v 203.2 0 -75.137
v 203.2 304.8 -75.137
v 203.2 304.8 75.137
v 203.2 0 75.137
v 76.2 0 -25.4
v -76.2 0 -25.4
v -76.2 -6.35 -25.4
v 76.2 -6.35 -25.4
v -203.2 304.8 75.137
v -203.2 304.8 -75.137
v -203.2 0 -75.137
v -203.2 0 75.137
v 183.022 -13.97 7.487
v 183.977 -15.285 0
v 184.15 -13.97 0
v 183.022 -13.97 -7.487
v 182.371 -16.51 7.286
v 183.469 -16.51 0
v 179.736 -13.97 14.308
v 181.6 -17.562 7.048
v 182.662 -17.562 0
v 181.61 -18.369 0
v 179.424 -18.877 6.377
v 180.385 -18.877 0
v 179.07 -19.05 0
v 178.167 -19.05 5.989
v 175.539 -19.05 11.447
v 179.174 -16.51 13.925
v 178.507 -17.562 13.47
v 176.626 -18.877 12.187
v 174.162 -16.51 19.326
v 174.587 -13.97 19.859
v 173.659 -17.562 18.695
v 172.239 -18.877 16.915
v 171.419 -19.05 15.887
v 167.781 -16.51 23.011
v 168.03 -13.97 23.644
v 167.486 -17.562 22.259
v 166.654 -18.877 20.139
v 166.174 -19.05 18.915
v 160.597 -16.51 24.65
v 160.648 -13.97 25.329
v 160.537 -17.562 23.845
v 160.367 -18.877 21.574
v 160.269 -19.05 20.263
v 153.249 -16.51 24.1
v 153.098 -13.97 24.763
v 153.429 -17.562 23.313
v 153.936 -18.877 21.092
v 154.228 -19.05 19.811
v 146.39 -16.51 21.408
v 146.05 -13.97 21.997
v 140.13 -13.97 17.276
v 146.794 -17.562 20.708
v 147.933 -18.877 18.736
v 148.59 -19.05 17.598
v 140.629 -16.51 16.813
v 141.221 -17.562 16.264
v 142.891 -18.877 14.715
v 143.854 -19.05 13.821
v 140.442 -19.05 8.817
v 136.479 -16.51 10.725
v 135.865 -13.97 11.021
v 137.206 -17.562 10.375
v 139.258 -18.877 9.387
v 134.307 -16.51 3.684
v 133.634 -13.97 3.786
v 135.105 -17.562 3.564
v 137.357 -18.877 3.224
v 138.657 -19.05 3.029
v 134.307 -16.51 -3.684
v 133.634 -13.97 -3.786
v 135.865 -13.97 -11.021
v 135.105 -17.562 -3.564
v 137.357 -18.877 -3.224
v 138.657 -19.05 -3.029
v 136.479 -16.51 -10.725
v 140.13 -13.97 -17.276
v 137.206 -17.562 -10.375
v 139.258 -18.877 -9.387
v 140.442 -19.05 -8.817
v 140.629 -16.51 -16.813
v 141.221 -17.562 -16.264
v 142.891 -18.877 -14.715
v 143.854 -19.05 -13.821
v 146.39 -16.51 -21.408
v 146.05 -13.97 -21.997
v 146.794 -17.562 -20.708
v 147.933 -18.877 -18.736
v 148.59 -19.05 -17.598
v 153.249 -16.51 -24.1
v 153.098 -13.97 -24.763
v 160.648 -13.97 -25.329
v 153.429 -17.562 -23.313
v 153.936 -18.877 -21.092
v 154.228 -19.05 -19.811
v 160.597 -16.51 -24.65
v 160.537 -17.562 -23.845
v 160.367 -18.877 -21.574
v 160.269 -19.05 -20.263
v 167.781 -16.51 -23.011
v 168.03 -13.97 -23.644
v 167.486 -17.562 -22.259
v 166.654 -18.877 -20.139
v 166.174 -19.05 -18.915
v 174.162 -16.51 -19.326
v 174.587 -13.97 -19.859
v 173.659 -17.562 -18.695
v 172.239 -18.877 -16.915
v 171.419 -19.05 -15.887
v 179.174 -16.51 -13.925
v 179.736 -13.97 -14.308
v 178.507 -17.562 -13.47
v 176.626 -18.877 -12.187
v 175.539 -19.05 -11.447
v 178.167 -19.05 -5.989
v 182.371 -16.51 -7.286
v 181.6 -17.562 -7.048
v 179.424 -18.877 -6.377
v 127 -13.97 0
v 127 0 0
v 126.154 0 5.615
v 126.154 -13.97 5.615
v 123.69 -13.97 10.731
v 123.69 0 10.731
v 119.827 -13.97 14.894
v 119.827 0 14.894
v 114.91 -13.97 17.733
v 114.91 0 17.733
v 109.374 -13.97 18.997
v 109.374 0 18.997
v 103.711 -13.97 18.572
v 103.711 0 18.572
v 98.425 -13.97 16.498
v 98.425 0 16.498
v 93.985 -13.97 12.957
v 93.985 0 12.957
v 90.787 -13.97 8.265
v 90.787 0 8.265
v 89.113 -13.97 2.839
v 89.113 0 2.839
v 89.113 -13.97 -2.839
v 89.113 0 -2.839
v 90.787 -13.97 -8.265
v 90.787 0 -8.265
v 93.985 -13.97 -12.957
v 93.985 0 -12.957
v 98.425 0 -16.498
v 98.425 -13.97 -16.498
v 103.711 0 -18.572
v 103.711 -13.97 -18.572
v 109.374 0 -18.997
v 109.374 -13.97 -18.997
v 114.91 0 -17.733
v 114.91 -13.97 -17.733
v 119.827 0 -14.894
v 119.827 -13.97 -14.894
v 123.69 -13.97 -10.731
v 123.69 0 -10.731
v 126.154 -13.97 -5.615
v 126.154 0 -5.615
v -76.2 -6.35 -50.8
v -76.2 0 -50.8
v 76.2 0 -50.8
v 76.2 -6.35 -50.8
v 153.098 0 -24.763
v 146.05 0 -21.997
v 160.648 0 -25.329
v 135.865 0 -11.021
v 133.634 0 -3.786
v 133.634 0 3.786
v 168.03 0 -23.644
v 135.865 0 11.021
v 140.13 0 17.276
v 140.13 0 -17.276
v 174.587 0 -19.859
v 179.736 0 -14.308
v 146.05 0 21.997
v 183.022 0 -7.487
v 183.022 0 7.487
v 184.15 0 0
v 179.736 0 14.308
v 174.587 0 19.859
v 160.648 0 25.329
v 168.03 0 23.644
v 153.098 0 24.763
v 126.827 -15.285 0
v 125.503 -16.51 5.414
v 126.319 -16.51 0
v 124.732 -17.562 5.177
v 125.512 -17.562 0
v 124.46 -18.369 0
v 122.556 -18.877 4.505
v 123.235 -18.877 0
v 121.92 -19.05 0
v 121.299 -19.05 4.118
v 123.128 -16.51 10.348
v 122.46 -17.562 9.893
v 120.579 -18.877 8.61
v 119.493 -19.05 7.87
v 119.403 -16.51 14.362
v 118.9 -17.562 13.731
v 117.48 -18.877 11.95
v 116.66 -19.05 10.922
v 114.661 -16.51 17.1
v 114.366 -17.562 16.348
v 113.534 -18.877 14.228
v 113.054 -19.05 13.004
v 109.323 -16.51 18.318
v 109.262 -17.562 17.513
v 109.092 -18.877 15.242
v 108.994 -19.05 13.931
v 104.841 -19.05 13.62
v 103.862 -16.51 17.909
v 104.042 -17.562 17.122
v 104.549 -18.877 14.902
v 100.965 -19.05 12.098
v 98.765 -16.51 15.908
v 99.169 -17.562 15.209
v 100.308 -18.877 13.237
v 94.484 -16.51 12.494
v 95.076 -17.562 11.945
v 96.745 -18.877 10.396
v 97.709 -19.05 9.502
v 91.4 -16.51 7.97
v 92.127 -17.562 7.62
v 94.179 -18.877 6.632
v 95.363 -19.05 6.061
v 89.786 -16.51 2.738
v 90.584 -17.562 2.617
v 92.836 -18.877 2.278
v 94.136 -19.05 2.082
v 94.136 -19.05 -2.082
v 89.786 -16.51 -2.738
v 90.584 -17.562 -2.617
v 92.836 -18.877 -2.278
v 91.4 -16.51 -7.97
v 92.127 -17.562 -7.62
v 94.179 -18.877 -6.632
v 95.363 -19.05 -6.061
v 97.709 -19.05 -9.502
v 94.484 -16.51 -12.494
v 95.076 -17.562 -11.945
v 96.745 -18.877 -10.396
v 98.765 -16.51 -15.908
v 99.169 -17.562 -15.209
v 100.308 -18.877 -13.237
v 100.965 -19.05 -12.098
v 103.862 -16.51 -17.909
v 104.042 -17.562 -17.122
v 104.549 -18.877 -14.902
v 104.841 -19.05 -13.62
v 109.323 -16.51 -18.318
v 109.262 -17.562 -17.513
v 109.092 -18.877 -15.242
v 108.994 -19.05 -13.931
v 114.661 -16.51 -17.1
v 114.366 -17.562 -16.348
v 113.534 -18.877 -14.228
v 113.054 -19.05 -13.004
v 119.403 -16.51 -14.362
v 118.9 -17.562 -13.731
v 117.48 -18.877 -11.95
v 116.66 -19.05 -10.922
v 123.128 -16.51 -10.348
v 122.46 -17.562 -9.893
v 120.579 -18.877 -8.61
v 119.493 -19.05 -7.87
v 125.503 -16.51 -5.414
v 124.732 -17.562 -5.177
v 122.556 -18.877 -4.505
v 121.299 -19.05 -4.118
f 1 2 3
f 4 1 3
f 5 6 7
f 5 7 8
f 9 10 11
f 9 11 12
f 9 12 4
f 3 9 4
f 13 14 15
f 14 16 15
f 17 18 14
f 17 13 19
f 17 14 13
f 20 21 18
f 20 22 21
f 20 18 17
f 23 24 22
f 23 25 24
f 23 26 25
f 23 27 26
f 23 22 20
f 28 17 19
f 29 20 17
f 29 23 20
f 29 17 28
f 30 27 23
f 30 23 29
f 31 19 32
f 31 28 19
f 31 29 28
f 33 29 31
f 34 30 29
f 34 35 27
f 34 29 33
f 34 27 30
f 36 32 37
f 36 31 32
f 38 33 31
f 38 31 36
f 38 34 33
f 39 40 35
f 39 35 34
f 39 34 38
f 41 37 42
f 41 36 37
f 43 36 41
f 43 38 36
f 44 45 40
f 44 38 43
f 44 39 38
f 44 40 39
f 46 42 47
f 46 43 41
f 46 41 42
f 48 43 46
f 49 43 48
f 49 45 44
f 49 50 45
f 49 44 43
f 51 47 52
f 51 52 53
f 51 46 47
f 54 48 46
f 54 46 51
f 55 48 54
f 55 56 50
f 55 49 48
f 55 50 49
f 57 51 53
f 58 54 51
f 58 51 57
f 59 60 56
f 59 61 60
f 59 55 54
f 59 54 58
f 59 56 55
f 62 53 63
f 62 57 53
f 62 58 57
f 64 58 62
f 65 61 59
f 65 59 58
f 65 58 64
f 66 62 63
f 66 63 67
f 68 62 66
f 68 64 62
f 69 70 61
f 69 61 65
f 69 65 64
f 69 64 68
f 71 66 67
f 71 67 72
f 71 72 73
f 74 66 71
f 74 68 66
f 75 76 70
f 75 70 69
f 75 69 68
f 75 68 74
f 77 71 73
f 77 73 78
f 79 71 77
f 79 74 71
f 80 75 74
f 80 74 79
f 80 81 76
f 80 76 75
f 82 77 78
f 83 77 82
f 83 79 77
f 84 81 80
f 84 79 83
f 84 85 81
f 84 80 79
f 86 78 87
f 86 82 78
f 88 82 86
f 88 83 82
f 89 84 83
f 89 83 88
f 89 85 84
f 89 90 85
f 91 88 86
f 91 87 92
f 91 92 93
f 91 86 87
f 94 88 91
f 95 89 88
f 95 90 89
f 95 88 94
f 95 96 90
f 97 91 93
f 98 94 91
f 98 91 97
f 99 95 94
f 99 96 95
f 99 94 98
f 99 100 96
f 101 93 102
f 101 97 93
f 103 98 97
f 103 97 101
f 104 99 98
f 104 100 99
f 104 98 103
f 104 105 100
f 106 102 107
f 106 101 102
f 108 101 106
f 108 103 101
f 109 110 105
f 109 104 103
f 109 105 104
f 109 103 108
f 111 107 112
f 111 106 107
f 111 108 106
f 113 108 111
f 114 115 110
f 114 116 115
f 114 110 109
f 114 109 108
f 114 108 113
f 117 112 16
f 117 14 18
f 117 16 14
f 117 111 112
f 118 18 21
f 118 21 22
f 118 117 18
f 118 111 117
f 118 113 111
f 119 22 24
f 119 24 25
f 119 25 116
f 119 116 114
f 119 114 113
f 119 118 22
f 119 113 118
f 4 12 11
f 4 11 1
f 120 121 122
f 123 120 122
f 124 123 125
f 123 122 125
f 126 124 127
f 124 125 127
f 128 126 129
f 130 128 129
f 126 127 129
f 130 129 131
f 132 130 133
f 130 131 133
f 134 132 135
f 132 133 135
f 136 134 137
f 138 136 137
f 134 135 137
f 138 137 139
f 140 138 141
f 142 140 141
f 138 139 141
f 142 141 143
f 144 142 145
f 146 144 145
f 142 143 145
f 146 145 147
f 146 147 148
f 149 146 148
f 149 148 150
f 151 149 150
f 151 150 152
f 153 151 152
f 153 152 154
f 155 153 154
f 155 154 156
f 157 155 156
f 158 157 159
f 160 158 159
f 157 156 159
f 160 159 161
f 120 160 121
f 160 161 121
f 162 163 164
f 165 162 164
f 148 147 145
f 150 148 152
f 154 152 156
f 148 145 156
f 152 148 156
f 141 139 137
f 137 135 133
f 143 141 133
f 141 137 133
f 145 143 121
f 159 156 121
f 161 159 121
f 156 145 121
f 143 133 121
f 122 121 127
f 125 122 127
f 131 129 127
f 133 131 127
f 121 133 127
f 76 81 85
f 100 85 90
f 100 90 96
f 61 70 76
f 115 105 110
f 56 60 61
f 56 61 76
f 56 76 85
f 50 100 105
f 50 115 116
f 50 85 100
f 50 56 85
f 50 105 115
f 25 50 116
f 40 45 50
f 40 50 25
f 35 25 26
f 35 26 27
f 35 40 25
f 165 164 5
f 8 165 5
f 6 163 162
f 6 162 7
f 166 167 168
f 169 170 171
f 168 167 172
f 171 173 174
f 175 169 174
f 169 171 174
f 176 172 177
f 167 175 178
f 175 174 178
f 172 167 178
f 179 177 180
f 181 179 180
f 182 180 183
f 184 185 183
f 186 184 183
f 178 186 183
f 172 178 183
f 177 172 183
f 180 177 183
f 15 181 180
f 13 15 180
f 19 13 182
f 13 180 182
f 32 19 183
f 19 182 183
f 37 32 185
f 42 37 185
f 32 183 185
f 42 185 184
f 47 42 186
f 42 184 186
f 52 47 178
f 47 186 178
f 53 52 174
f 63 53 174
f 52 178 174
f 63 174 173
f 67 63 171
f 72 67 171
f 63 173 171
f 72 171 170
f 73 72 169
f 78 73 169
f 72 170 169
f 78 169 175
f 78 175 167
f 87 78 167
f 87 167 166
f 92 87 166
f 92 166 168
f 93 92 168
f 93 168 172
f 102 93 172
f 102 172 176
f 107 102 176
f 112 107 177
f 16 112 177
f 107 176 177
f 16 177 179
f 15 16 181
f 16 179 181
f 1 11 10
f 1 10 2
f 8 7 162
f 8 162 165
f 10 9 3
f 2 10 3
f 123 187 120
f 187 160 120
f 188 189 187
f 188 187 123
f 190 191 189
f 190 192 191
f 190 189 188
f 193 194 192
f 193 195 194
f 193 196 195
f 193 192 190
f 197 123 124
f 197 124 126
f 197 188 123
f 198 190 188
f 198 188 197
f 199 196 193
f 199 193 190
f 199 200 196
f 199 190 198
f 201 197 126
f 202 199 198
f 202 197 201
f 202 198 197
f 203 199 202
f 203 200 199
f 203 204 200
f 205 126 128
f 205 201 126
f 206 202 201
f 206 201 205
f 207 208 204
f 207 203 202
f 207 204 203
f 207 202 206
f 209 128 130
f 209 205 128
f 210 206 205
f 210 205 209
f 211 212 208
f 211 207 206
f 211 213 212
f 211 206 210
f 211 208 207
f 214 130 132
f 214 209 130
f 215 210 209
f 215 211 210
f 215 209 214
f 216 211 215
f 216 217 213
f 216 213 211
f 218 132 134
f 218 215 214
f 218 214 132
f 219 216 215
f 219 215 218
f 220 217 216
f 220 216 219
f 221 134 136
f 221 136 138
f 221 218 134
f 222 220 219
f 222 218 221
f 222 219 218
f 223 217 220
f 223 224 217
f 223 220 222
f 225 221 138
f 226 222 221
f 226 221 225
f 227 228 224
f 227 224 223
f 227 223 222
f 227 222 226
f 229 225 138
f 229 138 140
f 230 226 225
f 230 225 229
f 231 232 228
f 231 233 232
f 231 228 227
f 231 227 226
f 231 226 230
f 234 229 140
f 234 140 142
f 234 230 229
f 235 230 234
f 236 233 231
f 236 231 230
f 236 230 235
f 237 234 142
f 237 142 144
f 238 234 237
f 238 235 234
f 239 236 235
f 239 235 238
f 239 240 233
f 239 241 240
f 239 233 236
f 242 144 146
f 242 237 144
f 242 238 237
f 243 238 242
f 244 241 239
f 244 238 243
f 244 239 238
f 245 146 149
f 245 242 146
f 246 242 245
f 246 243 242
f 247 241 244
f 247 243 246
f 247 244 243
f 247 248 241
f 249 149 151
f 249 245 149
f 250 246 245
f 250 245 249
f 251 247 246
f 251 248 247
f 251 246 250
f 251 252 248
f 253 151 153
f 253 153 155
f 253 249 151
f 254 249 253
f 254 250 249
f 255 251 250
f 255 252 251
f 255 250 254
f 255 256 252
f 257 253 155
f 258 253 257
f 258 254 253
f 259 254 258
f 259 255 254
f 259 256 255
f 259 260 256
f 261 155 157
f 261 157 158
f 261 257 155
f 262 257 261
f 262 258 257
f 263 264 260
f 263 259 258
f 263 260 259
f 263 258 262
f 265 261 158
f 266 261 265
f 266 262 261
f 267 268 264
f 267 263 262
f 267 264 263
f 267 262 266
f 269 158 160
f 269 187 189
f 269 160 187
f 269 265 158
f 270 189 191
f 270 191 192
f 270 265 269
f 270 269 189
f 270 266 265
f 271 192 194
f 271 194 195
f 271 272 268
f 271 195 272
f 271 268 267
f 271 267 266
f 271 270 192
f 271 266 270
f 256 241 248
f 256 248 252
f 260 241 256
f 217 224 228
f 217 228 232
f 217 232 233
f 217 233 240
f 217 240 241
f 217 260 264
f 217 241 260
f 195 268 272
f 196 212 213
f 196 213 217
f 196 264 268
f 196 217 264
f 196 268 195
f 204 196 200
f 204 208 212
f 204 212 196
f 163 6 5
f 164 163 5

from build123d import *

# Parameters (mm, degrees)
F0_W     = 406.4
F0_H     = 150.273638
F1_DEPTH = 304.8
F2_R     = 19.05
F2_R_2   = 25.4
F3_DEPTH = 19.05
F4_R     = 5.08
F5_W     = 152.4
F5_H     = 25.4
F6_DEPTH = 6.35


with BuildPart() as f1:
    # F0 (on Front) → F1 (new body)
    with BuildSketch(Plane.XZ):
        Rectangle(F0_W, F0_H)
    extrude(amount=-F1_DEPTH)


with BuildPart() as f3:
    # F2 (on face) → F3 (new body)
    with BuildSketch(Plane.XZ):
        with Locations((107.95, 0)):
            Circle(F2_R)
        with Locations((158.75, 0)):
            Circle(F2_R_2)
    extrude(amount=F3_DEPTH)

    # F4
    f4_edges = [f3.edges().sort_by_distance(p)[0] for p in [
        (88.9, -19.05, 0),
        (133.35, -19.05, 0),
    ]]
    fillet(f4_edges, radius=F4_R)


with BuildPart() as f6:
    # F5 (on face) → F6 (new body)
    with BuildSketch(Plane.XZ):
        Rectangle(F5_W, F5_H)
    extrude(amount=F6_DEPTH)


with BuildPart() as f6_1:
    # F7: moved
    add(f6.part.moved(Location((0, 0, -38.1))))


solid = Compound([f1.part, f3.part, f6_1.part])
